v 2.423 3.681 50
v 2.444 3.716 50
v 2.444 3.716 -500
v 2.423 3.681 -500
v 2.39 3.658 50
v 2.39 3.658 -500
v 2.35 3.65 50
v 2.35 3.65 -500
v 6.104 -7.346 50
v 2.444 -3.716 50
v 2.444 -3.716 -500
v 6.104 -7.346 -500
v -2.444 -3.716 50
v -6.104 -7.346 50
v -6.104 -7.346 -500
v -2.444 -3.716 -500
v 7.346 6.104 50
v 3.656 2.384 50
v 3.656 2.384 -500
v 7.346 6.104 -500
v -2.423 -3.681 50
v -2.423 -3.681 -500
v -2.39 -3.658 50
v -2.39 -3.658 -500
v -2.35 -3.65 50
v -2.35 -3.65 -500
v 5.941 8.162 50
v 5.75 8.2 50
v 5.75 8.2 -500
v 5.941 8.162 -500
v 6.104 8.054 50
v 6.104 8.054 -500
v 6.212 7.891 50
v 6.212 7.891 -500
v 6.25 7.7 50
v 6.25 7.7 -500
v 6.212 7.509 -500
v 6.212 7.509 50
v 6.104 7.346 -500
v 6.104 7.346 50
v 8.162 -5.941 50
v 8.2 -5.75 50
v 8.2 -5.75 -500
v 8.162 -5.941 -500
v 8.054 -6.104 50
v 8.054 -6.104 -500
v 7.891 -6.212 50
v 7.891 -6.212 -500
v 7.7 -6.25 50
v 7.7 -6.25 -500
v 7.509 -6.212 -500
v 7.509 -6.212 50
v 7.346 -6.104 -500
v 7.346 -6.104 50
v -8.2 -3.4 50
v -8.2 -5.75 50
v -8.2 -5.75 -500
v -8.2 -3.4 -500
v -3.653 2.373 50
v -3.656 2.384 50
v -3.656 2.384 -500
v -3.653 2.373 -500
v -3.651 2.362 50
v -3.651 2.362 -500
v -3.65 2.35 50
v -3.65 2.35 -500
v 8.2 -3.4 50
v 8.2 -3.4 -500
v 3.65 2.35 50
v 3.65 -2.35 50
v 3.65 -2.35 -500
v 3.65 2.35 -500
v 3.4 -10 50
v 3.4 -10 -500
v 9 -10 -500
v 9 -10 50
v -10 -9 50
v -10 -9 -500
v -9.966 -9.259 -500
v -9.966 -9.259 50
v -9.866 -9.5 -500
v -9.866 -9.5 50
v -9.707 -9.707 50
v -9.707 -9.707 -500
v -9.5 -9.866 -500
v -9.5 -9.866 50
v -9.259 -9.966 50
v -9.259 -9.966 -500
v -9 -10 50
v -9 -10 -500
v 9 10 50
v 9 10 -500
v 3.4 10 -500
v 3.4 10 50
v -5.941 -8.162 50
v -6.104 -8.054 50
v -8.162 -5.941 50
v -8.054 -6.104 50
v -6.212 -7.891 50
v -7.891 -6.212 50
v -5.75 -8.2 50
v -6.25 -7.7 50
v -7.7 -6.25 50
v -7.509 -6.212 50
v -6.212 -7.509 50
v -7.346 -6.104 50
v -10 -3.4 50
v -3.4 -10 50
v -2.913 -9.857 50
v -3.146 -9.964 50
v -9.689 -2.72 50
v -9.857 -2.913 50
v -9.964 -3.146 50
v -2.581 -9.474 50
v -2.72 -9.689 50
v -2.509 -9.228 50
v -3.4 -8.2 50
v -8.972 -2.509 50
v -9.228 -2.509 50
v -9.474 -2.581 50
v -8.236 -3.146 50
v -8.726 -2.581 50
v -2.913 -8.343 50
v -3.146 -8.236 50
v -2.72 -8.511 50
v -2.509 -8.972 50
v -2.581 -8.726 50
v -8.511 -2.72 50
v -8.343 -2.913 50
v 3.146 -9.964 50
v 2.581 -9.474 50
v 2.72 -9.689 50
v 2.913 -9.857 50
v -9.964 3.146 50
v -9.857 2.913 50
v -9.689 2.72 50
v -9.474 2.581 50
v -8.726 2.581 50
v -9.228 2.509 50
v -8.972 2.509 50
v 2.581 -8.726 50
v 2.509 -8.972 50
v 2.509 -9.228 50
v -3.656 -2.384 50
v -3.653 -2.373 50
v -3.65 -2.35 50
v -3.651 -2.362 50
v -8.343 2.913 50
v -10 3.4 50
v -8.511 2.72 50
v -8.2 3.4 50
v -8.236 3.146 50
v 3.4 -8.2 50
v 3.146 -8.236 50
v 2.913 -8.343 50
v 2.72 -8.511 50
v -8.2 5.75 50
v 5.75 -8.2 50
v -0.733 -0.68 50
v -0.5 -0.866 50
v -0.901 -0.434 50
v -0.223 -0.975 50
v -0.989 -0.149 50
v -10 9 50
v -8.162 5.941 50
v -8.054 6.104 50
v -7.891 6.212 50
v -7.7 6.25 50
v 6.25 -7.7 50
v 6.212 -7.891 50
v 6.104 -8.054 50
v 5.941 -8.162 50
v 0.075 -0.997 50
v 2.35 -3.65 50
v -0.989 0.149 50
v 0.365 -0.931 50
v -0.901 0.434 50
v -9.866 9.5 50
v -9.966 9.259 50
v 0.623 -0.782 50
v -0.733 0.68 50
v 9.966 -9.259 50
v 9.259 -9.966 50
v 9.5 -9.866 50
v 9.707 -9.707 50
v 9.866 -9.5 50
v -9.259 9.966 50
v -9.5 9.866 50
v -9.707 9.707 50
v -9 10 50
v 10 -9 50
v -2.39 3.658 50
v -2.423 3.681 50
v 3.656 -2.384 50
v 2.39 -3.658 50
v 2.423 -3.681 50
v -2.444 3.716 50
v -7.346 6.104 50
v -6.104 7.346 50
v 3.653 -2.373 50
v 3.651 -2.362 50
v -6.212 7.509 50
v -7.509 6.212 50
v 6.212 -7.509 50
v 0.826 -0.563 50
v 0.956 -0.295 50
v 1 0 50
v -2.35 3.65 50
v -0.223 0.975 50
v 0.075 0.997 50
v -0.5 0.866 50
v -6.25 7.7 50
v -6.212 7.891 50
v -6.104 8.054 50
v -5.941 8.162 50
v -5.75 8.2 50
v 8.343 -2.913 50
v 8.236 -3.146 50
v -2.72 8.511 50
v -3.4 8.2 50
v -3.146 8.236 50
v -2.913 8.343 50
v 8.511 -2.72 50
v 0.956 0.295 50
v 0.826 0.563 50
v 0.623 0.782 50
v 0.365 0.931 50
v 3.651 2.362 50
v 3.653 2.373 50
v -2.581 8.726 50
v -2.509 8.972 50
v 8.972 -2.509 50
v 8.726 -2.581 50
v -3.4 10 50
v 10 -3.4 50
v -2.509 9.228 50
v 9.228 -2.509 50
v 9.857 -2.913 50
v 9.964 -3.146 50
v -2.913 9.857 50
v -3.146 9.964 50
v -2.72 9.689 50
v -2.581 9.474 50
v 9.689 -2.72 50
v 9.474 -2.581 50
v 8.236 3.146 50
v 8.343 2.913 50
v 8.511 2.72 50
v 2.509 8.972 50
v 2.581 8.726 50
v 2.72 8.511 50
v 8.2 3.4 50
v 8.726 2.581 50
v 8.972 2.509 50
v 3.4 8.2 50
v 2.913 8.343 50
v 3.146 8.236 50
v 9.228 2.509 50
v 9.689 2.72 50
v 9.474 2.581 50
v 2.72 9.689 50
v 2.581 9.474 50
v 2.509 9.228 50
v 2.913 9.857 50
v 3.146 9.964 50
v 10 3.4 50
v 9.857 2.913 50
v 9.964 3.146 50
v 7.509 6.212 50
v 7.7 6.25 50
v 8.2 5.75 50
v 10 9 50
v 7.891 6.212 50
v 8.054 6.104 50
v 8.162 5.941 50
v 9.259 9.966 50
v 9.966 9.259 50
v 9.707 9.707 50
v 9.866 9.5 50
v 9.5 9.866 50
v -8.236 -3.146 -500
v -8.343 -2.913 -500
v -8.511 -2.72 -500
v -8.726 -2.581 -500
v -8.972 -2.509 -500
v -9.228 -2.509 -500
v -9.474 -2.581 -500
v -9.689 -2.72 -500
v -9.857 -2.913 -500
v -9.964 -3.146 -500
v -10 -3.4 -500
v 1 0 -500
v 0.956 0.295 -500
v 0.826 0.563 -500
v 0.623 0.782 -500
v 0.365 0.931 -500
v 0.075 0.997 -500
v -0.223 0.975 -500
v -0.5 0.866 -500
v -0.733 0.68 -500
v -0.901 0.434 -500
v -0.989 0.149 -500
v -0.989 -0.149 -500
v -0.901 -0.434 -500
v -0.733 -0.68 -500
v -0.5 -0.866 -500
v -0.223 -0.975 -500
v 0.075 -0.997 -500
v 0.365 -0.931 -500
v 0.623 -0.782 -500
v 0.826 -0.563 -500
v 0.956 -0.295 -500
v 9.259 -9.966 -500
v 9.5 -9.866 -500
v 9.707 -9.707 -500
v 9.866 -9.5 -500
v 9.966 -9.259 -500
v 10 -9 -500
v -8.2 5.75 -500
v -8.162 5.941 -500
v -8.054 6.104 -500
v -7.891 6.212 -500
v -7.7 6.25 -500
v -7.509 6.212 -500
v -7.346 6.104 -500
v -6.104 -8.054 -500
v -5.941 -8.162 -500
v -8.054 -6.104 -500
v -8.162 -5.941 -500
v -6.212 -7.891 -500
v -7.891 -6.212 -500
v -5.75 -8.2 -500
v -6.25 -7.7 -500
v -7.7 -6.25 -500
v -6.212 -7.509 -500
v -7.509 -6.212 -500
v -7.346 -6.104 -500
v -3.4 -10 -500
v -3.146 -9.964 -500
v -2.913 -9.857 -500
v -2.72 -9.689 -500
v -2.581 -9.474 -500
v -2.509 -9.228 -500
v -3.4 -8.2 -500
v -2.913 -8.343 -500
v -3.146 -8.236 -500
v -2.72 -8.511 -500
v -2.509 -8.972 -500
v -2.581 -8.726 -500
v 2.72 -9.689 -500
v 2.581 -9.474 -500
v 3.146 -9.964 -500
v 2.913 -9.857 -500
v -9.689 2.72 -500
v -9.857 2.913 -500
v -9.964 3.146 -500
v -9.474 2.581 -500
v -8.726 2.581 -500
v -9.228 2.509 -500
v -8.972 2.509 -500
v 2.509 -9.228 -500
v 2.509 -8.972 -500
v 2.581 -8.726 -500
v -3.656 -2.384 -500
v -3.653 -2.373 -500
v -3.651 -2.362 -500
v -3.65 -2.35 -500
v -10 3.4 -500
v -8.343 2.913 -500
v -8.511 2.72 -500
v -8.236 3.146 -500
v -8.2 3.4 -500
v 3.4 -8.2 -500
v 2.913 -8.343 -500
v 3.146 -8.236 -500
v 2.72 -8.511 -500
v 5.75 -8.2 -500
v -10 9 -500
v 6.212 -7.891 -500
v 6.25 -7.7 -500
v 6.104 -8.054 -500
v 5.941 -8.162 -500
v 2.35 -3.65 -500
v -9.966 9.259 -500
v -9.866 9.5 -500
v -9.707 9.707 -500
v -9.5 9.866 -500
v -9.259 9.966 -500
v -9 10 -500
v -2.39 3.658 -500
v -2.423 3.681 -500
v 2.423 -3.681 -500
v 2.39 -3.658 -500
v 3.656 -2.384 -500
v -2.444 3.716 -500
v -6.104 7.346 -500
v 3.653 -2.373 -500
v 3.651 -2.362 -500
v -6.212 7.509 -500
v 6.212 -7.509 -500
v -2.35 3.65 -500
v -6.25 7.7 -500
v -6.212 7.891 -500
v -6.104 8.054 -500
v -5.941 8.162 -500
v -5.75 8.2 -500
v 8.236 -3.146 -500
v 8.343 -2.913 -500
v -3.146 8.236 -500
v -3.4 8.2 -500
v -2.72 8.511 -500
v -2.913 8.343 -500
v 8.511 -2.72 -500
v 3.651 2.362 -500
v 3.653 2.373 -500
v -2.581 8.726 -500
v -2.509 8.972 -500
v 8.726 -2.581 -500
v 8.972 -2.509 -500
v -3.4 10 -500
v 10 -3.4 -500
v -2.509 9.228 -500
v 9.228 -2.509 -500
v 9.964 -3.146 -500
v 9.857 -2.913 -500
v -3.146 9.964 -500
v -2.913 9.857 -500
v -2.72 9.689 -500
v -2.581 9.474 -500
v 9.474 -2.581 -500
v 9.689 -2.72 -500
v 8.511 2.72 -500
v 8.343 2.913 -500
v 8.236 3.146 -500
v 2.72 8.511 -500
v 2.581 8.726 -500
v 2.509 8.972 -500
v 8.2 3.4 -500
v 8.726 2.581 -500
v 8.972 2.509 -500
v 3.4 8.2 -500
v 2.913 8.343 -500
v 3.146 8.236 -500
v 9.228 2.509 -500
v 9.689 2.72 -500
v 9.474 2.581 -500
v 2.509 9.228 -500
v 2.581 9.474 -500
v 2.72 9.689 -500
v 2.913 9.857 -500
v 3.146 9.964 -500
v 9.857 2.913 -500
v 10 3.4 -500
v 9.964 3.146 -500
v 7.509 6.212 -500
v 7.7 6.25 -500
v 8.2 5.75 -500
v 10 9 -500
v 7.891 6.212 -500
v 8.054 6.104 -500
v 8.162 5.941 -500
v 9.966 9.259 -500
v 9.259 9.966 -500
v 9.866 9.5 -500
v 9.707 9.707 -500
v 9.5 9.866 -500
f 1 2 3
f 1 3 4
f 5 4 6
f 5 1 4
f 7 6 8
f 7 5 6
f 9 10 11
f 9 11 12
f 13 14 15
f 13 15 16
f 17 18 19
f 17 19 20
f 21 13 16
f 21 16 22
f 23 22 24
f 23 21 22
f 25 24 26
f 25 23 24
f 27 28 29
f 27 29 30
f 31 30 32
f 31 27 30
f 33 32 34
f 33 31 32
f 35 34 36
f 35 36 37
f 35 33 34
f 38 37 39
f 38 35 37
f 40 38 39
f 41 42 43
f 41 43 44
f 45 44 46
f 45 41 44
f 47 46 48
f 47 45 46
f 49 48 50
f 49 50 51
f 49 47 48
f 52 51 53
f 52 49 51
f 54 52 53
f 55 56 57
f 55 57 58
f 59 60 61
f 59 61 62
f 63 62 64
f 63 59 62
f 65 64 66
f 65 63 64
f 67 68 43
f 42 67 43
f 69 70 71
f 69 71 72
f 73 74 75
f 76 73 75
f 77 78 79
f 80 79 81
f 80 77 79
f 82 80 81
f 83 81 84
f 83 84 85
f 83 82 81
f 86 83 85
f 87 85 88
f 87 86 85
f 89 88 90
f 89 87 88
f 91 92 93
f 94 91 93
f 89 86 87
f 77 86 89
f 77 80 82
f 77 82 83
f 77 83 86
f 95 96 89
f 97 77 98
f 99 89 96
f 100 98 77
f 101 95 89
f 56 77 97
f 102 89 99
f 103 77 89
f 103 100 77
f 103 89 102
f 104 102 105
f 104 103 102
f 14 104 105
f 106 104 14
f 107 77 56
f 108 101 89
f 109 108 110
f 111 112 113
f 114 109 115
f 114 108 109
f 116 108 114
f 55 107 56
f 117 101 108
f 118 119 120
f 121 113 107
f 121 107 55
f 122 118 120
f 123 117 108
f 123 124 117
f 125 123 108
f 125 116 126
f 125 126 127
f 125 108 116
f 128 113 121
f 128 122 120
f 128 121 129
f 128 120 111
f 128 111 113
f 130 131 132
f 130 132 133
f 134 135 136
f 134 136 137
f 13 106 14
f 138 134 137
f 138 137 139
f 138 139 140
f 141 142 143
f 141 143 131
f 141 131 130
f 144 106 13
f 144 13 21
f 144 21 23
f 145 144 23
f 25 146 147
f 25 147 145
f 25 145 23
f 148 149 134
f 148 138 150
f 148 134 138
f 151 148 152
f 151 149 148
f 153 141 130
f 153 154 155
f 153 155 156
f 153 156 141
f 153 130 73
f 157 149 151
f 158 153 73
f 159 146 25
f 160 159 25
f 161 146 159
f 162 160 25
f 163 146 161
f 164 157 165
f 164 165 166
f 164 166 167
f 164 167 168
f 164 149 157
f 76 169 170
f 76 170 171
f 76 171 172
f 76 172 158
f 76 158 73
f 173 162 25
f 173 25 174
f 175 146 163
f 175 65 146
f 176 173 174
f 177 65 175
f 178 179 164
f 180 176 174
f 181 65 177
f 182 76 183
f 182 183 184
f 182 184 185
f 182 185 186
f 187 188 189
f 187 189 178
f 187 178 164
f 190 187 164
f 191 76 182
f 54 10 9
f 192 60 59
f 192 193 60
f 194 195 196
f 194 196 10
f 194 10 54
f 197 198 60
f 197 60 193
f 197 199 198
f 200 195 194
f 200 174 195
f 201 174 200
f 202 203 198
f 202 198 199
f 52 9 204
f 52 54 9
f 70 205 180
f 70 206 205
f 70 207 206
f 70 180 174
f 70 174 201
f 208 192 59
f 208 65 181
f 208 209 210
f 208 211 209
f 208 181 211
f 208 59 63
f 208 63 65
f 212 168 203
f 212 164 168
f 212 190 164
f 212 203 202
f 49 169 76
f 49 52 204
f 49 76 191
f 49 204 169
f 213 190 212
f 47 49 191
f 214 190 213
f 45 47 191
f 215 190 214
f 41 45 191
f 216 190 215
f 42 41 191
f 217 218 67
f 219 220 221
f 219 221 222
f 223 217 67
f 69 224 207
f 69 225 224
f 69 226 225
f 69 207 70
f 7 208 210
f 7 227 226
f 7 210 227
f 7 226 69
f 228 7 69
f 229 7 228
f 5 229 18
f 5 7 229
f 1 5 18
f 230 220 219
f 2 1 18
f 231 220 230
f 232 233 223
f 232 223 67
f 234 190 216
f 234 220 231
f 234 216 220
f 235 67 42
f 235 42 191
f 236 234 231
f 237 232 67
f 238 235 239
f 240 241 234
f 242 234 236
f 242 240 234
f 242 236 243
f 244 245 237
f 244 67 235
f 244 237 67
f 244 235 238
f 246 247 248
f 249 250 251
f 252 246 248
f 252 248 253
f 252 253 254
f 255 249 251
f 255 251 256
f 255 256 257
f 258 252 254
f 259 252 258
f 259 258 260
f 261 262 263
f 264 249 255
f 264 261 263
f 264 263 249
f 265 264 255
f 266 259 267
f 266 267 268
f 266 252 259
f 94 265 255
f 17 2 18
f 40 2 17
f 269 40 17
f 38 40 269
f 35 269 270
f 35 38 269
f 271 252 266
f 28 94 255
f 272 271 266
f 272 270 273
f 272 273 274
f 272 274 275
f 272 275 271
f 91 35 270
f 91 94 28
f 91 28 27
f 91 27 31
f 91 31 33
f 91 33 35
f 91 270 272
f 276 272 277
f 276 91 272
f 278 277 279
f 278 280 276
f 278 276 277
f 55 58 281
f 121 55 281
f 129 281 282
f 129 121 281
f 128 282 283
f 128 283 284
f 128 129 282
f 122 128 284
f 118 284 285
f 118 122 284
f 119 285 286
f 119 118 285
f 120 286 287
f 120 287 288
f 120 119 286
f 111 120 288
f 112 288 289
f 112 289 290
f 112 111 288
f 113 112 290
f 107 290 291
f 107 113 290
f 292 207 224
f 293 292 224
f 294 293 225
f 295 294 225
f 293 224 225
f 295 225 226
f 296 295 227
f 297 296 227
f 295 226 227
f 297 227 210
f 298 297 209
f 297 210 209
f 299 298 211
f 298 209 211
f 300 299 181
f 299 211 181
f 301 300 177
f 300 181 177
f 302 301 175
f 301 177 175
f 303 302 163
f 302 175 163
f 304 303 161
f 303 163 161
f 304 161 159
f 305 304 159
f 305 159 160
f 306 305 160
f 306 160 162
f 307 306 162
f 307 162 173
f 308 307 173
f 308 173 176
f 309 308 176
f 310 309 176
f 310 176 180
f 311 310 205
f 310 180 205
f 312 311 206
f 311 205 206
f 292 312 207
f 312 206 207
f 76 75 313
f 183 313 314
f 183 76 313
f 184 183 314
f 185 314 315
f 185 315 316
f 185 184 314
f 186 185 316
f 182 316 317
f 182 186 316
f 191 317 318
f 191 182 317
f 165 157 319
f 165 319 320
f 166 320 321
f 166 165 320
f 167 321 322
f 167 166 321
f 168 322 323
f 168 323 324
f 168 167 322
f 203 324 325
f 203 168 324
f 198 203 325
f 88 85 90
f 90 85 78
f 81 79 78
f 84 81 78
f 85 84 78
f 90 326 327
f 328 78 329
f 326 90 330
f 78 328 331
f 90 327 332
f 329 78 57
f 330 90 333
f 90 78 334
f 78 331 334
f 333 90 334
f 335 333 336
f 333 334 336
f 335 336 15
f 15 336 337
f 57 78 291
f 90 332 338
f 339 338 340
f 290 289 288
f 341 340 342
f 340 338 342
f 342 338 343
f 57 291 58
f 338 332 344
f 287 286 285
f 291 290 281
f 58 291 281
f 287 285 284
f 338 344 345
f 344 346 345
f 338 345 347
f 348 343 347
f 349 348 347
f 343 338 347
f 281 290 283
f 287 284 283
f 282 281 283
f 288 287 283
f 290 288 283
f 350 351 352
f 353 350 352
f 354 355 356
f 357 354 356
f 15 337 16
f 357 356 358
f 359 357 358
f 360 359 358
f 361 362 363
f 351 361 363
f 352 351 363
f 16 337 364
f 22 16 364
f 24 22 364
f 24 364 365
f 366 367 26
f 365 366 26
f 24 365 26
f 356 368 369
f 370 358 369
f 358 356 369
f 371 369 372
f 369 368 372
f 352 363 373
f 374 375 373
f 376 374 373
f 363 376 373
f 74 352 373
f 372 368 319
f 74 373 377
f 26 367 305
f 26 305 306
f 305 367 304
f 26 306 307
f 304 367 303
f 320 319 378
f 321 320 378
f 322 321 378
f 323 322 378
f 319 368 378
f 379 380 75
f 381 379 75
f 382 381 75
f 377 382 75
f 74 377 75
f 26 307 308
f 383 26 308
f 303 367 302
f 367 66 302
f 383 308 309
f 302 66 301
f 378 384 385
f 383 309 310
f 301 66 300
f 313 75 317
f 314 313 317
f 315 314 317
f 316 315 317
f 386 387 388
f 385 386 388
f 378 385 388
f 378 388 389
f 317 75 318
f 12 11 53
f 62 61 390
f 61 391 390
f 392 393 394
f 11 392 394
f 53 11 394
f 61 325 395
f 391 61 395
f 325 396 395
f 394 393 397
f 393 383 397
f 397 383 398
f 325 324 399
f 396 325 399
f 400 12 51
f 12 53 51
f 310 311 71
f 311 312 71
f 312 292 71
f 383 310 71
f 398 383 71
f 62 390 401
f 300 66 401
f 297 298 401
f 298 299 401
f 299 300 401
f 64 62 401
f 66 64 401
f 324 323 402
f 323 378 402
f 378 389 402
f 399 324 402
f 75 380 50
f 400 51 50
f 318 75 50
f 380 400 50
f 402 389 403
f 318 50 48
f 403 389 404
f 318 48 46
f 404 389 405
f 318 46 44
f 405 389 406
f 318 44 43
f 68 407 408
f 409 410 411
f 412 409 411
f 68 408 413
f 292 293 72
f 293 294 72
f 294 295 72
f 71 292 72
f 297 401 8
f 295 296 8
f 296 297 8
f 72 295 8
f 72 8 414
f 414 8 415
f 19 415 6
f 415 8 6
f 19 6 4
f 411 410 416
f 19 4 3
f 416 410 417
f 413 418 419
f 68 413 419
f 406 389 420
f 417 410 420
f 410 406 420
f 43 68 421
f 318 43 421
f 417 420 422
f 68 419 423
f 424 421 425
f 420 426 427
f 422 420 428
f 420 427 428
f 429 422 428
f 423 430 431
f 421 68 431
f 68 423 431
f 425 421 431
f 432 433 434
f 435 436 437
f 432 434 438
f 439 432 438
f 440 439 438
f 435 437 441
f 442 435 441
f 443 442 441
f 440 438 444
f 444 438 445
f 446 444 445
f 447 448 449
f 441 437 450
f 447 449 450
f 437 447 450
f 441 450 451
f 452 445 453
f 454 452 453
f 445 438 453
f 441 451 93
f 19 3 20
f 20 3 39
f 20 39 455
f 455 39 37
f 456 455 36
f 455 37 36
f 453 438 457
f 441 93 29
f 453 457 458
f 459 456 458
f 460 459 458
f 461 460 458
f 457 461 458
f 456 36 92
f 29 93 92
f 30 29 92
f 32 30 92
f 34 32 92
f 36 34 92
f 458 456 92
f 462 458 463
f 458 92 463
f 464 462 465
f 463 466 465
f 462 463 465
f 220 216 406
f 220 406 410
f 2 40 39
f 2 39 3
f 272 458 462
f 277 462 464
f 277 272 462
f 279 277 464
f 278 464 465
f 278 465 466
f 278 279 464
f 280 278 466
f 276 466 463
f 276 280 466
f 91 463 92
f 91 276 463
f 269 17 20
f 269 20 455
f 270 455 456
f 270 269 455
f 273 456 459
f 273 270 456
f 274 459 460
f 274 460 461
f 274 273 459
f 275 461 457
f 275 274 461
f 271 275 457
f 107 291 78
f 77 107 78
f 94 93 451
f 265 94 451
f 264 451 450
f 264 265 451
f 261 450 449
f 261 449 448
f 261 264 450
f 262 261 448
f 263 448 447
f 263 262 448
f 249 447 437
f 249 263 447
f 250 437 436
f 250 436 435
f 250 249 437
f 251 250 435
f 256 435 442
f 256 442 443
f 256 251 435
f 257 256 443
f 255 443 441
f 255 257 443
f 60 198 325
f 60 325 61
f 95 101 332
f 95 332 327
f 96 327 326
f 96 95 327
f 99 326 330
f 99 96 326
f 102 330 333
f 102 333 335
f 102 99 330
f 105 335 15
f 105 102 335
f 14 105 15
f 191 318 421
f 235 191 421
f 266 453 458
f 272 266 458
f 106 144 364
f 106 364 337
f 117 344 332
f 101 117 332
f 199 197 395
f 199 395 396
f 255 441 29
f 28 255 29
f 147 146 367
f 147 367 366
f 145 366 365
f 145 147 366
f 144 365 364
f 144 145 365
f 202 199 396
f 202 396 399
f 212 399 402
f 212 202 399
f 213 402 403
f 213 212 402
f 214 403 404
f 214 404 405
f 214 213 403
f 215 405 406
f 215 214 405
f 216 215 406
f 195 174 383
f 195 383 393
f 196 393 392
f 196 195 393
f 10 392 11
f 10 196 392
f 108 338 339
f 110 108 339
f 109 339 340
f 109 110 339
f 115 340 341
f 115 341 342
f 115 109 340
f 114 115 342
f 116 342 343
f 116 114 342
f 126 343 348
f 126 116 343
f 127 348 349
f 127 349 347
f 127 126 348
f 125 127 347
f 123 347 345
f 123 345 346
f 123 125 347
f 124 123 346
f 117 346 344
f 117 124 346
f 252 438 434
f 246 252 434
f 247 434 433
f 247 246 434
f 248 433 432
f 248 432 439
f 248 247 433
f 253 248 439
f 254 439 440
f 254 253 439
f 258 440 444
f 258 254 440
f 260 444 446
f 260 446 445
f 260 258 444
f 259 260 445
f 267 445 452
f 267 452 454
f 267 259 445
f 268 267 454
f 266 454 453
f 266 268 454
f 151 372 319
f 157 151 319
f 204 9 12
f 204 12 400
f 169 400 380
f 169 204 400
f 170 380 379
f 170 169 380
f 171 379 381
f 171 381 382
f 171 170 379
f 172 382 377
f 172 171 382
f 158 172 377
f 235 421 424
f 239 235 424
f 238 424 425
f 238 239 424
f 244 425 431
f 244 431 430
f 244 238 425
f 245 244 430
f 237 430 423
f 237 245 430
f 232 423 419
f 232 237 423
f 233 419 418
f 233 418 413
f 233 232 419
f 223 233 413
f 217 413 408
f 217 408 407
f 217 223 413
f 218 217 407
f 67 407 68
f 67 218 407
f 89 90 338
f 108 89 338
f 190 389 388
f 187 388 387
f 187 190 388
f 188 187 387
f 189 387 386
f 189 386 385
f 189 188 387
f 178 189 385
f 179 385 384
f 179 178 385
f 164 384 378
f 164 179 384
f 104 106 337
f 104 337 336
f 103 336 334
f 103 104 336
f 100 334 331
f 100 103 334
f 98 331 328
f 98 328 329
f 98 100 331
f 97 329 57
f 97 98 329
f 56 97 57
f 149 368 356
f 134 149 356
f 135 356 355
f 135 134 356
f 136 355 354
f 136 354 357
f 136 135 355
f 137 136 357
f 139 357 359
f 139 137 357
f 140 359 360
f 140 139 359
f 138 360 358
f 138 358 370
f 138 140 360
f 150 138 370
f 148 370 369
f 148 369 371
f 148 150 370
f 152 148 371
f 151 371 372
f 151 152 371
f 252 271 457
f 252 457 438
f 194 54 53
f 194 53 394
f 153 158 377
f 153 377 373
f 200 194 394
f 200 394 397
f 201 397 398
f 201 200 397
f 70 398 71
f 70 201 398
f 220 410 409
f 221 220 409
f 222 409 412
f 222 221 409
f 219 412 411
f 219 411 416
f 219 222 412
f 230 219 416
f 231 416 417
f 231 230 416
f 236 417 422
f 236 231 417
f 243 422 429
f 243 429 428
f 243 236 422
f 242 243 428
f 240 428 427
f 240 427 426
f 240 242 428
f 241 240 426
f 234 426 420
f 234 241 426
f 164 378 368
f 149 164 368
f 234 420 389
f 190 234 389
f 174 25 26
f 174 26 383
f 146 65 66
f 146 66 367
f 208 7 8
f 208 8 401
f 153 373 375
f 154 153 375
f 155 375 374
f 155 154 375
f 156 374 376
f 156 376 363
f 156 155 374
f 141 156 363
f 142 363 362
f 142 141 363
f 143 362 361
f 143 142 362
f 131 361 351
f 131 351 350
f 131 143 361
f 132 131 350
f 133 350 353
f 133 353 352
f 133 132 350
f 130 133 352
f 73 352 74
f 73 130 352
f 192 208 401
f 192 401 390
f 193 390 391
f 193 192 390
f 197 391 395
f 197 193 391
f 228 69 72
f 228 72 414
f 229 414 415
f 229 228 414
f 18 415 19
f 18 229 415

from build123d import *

# Parameters (mm, degrees)
SKETCH1_R           = 1
BOSS_EXTRUDE1_DEPTH = 550


with BuildPart() as part:
    # Sketch1 → Boss-Extrude1 (new body)
    with BuildSketch(Plane.XY.offset(50)):
        with BuildLine():
            Line((-10, 9), (-10, 3.4))
            ThreePointArc((-10, 3.4), (-9.1, 2.5), (-8.2, 3.4))
            Line((-8.2, 3.4), (-8.2, 5.75))
            ThreePointArc((-8.2, 5.75), (-7.891341716, 6.211939766), (-7.346446609, 6.103553391))
            Line((-7.346446609, 6.103553391), (-3.656030738, 2.384202014))
            ThreePointArc((-3.656030738, 2.384202014), (-3.651519225, 2.367364818), (-3.65, 2.35))
            Line((-3.65, 2.35), (-3.65, -2.35))
            ThreePointArc((-3.65, -2.35), (-3.651519225, -2.367364818), (-3.656030738, -2.384202014))
            Line((-3.656030738, -2.384202014), (-7.346446609, -6.103553391))
            ThreePointArc((-7.346446609, -6.103553391), (-7.891341716, -6.211939766), (-8.2, -5.75))
            Line((-8.2, -5.75), (-8.2, -3.4))
            ThreePointArc((-8.2, -3.4), (-9.1, -2.5), (-10, -3.4))
            Line((-10, -3.4), (-10, -9))
            ThreePointArc((-10, -9), (-9.707106781, -9.707106781), (-9, -10))
            Line((-9, -10), (-3.4, -10))
            ThreePointArc((-3.4, -10), (-2.5, -9.1), (-3.4, -8.2))
            Line((-3.4, -8.2), (-5.75, -8.2))
            ThreePointArc((-5.75, -8.2), (-6.211939766, -7.891341716), (-6.103553391, -7.346446609))
            Line((-6.103553391, -7.346446609), (-2.443969262, -3.715797986))
            ThreePointArc((-2.443969262, -3.715797986), (-2.407357644, -3.668084796), (-2.35, -3.65))
            Line((-2.35, -3.65), (2.35, -3.65))
            ThreePointArc((2.35, -3.65), (2.407357644, -3.668084796), (2.443969262, -3.715797986))
            Line((2.443969262, -3.715797986), (6.103553391, -7.346446609))
            ThreePointArc((6.103553391, -7.346446609), (6.211939766, -7.891341716), (5.75, -8.2))
            Line((5.75, -8.2), (3.4, -8.2))
            ThreePointArc((3.4, -8.2), (2.5, -9.1), (3.4, -10))
            Line((3.4, -10), (9, -10))
            ThreePointArc((9, -10), (9.707106781, -9.707106781), (10, -9))
            Line((10, -9), (10, -3.4))
            ThreePointArc((10, -3.4), (9.1, -2.5), (8.2, -3.4))
            Line((8.2, -3.4), (8.2, -5.75))
            ThreePointArc((8.2, -5.75), (7.891341716, -6.211939766), (7.346446609, -6.103553391))
            Line((7.346446609, -6.103553391), (3.656030738, -2.384202014))
            ThreePointArc((3.656030738, -2.384202014), (3.651519225, -2.367364818), (3.65, -2.35))
            Line((3.65, -2.35), (3.65, 2.35))
            ThreePointArc((3.65, 2.35), (3.651519225, 2.367364818), (3.656030738, 2.384202014))
            Line((3.656030738, 2.384202014), (7.346446609, 6.103553391))
            ThreePointArc((7.346446609, 6.103553391), (7.891341716, 6.211939766), (8.2, 5.75))
            Line((8.2, 5.75), (8.2, 3.4))
            ThreePointArc((8.2, 3.4), (9.1, 2.5), (10, 3.4))
            Line((10, 3.4), (10, 9))
            ThreePointArc((10, 9), (9.707106781, 9.707106781), (9, 10))
            Line((9, 10), (3.4, 10))
            ThreePointArc((3.4, 10), (2.5, 9.1), (3.4, 8.2))
            Line((3.4, 8.2), (5.75, 8.2))
            ThreePointArc((5.75, 8.2), (6.211939766, 7.891341716), (6.103553391, 7.346446609))
            Line((6.103553391, 7.346446609), (2.443969262, 3.715797986))
            ThreePointArc((2.443969262, 3.715797986), (2.407357644, 3.668084796), (2.35, 3.65))
            Line((2.35, 3.65), (-2.35, 3.65))
            ThreePointArc((-2.35, 3.65), (-2.407357644, 3.668084796), (-2.443969262, 3.715797986))
            Line((-2.443969262, 3.715797986), (-6.103553391, 7.346446609))
            ThreePointArc((-6.103553391, 7.346446609), (-6.211939766, 7.891341716), (-5.75, 8.2))
            Line((-5.75, 8.2), (-3.4, 8.2))
            ThreePointArc((-3.4, 8.2), (-2.5, 9.1), (-3.4, 10))
            Line((-3.4, 10), (-9, 10))
            ThreePointArc((-9, 10), (-9.707106781, 9.707106781), (-10, 9))
        make_face()
        Circle(SKETCH1_R, mode=Mode.SUBTRACT)
    extrude(amount=-BOSS_EXTRUDE1_DEPTH)


solid = part.part
